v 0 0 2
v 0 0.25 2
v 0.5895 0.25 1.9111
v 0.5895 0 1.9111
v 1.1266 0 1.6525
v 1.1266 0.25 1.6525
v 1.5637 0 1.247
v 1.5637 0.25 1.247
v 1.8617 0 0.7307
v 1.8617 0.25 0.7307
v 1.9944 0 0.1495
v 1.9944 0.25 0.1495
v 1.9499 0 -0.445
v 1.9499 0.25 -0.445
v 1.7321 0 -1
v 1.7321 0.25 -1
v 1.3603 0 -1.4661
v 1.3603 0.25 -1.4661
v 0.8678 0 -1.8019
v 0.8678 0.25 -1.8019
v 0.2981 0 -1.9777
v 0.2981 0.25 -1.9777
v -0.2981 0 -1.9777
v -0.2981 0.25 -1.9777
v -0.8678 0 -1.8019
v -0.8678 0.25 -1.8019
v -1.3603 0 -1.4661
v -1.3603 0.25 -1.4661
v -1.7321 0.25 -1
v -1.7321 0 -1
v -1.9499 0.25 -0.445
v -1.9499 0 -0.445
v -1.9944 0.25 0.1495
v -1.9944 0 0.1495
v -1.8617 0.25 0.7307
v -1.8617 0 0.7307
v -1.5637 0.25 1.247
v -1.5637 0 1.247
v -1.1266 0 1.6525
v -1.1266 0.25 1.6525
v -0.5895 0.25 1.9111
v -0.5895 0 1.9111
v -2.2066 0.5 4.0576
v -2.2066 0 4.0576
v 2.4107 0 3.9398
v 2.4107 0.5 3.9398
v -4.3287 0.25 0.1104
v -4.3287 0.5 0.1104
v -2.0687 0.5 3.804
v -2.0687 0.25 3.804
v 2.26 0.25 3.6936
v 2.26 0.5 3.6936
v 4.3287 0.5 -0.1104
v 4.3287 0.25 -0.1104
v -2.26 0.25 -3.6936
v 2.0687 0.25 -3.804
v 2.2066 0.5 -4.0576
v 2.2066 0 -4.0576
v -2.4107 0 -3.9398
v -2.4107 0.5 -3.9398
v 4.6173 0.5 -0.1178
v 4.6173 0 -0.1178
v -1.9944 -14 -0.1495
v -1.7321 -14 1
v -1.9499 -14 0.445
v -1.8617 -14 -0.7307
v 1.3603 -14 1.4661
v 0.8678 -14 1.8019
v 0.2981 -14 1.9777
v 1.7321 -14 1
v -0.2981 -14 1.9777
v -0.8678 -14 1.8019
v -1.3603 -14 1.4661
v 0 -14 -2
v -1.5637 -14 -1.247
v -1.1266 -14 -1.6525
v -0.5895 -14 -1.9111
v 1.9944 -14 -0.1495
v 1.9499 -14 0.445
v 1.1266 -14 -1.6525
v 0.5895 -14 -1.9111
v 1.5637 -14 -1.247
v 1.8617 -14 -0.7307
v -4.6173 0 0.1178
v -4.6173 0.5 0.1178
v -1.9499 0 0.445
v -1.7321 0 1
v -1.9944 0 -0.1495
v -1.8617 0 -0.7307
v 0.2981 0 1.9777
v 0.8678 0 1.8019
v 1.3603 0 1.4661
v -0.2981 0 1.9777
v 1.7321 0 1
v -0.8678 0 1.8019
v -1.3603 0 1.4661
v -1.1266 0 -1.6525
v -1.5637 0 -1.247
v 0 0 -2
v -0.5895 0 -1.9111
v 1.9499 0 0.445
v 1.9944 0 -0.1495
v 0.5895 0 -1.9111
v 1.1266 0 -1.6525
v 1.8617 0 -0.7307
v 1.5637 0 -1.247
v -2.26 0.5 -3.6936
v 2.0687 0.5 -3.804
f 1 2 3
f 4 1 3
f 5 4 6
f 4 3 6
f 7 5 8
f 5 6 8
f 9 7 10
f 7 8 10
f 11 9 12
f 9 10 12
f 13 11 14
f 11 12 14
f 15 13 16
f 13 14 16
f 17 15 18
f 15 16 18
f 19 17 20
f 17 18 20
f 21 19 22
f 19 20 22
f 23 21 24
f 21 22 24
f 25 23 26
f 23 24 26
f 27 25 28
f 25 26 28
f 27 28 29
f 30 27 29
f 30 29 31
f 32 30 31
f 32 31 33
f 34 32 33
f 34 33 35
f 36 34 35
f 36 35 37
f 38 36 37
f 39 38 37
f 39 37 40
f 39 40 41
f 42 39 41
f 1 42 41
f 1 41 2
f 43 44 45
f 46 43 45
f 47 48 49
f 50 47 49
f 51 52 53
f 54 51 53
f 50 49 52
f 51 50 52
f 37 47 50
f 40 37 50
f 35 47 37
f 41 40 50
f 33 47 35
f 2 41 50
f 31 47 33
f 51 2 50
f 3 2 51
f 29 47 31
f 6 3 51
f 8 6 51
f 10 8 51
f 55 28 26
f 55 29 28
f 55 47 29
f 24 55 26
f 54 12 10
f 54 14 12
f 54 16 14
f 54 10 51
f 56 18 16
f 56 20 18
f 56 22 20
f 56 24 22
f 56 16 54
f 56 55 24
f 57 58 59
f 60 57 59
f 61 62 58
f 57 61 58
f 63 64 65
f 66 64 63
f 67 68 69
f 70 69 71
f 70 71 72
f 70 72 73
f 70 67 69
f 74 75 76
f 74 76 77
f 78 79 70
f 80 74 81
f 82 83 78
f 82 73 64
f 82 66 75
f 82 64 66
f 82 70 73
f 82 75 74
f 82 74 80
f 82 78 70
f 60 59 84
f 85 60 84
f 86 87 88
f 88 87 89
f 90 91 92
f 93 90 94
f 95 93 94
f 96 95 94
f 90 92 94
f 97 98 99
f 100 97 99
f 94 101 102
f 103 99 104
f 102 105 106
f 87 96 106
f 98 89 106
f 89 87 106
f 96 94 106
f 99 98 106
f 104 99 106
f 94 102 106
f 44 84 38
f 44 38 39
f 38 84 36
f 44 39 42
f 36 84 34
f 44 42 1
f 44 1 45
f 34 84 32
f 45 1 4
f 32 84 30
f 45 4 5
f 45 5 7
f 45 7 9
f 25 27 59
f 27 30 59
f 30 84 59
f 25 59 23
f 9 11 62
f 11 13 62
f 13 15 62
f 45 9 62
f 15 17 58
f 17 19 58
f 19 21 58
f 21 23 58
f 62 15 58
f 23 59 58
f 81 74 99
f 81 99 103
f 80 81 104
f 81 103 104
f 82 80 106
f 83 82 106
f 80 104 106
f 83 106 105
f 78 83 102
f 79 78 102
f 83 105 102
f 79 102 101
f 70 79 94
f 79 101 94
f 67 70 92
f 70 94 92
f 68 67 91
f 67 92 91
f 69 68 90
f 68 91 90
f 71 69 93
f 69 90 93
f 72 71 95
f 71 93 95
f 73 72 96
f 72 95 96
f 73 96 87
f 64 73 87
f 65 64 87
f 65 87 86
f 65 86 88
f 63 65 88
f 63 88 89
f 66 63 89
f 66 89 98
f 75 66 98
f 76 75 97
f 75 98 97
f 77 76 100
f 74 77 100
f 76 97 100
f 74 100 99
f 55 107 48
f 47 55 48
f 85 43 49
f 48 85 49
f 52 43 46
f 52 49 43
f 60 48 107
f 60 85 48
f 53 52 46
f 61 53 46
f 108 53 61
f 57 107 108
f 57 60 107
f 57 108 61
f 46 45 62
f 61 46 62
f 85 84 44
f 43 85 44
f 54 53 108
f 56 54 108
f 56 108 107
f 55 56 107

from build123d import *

# Parameters (mm, degrees)
BOSS_EXTRUDE1_DEPTH = 0.5
CUT_EXTRUDE1_DEPTH  = 0.25
SKETCH5_R           = 2
CUT_EXTRUDE4_DEPTH  = 14
SKETCH6_R           = 2
BOSS_EXTRUDE3_DEPTH = 14


with BuildPart() as part:
    # Sketch1 → Boss-Extrude1 (new body)
    with BuildSketch(Plane(origin=(0, 0, 0), x_dir=(1, 0, 0), z_dir=(0, 1, 0))):
        Polygon((-2.410657111, 3.939805278), (-4.617300012, -0.117787659), (-2.206642901, -4.057592937), (2.410657111, -3.939805278), (4.617300012, 0.117787659), (2.206642901, 4.057592937), align=None)
    extrude(amount=BOSS_EXTRUDE1_DEPTH)

    # Sketch2 → Cut-Extrude1 (cut)
    with BuildSketch(Plane(origin=(0, 0.5, 0), x_dir=(1, 0, 0), z_dir=(0, 1, 0))):
        Polygon((4.328718761, 0.11042593), (2.06872772, 3.803993378), (-2.259991041, 3.693567448), (-4.328718761, -0.11042593), (-2.06872772, -3.803993378), (2.259991041, -3.693567448), align=None)
    extrude(amount=-CUT_EXTRUDE1_DEPTH, mode=Mode.SUBTRACT)

    # Sketch5 → Cut-Extrude4 (cut)
    with BuildSketch(Plane(origin=(0, 0.25, 0), x_dir=(1, 0, 0), z_dir=(0, 1, 0))):
        with Locations(Location((0, 0, 0), (0, 0, 270))):
            Circle(SKETCH5_R)
    extrude(amount=-CUT_EXTRUDE4_DEPTH, mode=Mode.SUBTRACT)


with BuildPart() as body_2:
    # Sketch6 → Boss-Extrude3 (new body)
    with BuildSketch(Plane.XZ):
        with Locations(Location((0, 0, 0), (0, 0, 270))):
            Circle(SKETCH6_R)
    extrude(amount=BOSS_EXTRUDE3_DEPTH)


solid = Compound([part.part, body_2.part])
